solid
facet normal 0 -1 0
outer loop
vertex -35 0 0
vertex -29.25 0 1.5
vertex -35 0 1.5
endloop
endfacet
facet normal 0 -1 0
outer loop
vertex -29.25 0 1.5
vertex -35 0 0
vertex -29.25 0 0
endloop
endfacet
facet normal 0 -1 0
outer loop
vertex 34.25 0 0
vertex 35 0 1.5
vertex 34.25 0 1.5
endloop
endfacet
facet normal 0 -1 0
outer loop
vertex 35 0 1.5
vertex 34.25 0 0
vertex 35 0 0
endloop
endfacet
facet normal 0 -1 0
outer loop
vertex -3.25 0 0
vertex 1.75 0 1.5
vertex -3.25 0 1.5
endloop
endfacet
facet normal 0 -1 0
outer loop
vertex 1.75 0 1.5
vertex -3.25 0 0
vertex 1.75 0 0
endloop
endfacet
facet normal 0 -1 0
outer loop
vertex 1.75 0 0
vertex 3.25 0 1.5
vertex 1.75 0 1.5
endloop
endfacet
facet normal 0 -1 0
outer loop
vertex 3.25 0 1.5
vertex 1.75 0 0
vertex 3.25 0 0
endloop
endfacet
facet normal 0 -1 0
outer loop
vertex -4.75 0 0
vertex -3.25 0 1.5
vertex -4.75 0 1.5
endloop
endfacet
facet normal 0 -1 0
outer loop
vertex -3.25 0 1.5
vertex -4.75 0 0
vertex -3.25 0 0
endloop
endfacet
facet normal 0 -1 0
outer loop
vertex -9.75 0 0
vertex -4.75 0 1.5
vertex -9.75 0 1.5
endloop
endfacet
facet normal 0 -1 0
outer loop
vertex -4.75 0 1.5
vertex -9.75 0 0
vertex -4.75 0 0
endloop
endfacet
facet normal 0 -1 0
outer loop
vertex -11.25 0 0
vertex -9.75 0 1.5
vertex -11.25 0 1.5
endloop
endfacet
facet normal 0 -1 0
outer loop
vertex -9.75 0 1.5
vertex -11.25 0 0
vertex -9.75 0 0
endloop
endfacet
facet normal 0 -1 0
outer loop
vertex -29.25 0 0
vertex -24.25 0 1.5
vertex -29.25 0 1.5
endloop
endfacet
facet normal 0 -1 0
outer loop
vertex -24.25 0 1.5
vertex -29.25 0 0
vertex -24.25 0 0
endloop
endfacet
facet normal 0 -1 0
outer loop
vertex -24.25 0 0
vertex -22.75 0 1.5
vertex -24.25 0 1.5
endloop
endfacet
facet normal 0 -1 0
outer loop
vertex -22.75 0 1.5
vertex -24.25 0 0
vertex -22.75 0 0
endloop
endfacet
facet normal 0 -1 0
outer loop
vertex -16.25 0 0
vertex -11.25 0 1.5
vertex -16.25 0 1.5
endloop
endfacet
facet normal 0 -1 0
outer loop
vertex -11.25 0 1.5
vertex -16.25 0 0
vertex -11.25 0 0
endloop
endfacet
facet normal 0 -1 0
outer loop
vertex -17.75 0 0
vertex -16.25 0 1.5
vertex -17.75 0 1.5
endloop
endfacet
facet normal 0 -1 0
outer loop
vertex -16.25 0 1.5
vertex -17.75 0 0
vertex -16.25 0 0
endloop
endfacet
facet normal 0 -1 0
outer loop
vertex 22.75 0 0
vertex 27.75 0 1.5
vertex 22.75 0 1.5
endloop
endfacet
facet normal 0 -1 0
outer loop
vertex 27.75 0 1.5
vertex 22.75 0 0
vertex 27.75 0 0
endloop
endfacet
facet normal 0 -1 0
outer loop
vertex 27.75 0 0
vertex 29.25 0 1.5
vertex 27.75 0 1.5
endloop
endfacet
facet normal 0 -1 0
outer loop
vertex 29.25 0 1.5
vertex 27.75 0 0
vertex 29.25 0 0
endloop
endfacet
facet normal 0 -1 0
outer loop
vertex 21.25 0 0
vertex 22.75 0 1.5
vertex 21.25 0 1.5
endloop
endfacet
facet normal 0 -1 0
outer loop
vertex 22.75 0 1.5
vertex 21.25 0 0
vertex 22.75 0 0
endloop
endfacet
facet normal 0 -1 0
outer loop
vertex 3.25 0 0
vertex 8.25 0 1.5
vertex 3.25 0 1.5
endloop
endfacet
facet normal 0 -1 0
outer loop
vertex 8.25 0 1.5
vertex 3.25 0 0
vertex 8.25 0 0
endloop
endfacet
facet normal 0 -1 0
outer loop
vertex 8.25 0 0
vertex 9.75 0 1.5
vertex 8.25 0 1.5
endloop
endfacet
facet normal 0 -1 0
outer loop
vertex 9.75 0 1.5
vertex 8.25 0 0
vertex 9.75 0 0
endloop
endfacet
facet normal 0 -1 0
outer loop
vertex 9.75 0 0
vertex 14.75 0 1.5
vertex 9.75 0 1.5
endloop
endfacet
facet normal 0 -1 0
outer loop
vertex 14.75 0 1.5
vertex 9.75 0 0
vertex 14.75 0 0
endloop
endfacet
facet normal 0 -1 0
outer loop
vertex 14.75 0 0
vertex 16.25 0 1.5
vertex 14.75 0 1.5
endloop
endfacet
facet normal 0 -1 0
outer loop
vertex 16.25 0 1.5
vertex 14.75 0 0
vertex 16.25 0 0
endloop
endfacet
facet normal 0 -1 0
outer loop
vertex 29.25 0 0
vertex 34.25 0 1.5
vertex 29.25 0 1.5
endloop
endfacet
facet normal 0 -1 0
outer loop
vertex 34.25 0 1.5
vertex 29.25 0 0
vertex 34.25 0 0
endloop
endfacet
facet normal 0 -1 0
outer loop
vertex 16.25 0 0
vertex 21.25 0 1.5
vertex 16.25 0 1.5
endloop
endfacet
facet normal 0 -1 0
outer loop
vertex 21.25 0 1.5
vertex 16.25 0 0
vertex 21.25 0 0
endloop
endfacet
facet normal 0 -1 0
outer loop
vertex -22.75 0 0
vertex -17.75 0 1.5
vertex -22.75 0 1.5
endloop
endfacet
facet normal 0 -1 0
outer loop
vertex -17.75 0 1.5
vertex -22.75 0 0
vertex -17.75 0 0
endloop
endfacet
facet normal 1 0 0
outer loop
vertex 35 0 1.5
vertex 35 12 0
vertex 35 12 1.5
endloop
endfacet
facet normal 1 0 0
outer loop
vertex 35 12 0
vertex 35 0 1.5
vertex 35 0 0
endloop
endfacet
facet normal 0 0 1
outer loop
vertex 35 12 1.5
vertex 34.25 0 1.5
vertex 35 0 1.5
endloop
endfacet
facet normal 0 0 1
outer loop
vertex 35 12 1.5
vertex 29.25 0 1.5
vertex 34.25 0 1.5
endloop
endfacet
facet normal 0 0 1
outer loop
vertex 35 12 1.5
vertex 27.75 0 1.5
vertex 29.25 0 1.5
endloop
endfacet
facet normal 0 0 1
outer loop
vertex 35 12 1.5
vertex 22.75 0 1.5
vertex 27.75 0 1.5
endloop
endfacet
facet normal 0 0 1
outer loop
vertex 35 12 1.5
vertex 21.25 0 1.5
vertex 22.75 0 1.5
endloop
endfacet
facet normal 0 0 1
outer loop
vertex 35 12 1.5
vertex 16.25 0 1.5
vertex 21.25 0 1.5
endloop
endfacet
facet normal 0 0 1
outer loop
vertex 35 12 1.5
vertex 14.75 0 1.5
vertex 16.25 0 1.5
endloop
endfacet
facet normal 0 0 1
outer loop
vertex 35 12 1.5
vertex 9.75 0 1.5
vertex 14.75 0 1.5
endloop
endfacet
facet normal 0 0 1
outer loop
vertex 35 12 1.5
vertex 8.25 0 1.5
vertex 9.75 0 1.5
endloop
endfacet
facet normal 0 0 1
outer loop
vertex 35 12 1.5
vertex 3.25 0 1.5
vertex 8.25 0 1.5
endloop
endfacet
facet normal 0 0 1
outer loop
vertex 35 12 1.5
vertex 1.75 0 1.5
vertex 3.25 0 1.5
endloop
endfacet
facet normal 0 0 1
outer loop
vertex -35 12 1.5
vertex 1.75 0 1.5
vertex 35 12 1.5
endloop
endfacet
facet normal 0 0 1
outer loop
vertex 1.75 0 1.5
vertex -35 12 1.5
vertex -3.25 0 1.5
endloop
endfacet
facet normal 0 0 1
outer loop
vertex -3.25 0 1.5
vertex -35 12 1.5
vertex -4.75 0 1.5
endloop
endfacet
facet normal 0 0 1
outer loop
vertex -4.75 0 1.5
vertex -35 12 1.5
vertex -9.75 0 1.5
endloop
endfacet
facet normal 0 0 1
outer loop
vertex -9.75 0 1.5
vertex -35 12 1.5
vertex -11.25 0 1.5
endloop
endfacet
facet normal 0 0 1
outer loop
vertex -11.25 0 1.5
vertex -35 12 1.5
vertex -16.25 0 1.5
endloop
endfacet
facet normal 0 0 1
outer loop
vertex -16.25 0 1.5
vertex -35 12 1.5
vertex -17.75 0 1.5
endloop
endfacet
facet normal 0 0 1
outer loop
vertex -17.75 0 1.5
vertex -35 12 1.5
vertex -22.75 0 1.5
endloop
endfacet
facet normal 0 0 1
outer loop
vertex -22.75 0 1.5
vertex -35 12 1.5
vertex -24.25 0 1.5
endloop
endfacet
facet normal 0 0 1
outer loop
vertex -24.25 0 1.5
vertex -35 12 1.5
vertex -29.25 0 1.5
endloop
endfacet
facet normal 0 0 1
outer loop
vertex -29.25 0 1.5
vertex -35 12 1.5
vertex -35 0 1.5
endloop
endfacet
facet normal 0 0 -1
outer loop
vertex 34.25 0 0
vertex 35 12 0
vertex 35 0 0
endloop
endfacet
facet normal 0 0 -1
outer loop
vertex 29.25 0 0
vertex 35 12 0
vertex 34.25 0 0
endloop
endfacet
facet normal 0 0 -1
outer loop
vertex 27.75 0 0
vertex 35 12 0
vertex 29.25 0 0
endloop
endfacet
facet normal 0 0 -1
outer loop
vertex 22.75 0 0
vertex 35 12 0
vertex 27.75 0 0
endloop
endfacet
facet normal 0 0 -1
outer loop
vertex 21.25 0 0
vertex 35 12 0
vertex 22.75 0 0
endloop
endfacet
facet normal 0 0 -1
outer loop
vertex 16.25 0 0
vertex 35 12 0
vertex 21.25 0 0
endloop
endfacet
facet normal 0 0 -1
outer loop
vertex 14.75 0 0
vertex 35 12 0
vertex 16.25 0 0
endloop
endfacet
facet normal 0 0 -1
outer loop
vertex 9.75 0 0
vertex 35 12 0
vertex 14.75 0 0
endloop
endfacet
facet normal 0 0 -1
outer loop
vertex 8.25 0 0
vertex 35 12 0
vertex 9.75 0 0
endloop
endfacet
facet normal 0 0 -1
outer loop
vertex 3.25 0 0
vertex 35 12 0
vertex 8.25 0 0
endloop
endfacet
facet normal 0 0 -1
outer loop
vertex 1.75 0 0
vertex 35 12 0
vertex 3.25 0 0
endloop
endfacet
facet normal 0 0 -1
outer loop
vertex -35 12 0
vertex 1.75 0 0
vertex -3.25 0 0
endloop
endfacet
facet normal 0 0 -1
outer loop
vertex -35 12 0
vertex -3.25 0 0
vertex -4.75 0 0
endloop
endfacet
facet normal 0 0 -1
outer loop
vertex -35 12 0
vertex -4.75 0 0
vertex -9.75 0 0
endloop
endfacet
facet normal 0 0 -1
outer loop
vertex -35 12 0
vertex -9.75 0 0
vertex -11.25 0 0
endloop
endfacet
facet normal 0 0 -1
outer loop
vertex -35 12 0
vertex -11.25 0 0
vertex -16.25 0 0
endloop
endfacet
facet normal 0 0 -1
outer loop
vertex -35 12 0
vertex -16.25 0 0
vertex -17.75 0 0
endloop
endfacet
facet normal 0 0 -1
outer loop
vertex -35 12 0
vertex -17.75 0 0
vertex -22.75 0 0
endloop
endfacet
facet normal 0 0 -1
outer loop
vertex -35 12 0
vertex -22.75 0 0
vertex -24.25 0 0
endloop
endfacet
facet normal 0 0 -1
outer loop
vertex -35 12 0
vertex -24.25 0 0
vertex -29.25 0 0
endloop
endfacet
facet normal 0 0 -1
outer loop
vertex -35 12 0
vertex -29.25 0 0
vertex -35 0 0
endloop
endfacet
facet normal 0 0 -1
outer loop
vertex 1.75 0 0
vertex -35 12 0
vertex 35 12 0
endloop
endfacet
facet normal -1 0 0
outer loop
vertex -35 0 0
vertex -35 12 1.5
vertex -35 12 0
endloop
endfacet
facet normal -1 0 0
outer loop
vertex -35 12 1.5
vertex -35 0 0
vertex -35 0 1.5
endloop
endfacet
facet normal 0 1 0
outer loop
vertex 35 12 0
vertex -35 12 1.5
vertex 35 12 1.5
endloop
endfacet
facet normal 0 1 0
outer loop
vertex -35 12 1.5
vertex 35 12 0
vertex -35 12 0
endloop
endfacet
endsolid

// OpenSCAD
// 10-well comb for agarose gel casting, printed lying flat
// Units: mm

plate_t      = 1.5;   // plate thickness (Z)
spine_len    = 70;    // spine length (X)
spine_w      = 12;    // spine width (Y)
tooth_count  = 10;    // number of teeth
tooth_w      = 5.0;   // tooth width (X)
tooth_len    = 12;    // tooth length (Y)
tooth_gap    = 1.5;   // gap between teeth (X)
eps          = 0.5;   // cutter overshoot

$fn = 64;

pitch = tooth_w + tooth_gap;  // 6.5 mm

difference() {
    // Spine
    translate([-spine_len/2, 0, 0])
        cube([spine_len, spine_w, plate_t]);

    // Teeth, centred on spine in X
    for (i = [0 : tooth_count - 1])
        translate([(i - (tooth_count - 1)/2) * pitch, -tooth_len, 0])
            cube([tooth_w, tooth_len, plate_t + eps]);
}
